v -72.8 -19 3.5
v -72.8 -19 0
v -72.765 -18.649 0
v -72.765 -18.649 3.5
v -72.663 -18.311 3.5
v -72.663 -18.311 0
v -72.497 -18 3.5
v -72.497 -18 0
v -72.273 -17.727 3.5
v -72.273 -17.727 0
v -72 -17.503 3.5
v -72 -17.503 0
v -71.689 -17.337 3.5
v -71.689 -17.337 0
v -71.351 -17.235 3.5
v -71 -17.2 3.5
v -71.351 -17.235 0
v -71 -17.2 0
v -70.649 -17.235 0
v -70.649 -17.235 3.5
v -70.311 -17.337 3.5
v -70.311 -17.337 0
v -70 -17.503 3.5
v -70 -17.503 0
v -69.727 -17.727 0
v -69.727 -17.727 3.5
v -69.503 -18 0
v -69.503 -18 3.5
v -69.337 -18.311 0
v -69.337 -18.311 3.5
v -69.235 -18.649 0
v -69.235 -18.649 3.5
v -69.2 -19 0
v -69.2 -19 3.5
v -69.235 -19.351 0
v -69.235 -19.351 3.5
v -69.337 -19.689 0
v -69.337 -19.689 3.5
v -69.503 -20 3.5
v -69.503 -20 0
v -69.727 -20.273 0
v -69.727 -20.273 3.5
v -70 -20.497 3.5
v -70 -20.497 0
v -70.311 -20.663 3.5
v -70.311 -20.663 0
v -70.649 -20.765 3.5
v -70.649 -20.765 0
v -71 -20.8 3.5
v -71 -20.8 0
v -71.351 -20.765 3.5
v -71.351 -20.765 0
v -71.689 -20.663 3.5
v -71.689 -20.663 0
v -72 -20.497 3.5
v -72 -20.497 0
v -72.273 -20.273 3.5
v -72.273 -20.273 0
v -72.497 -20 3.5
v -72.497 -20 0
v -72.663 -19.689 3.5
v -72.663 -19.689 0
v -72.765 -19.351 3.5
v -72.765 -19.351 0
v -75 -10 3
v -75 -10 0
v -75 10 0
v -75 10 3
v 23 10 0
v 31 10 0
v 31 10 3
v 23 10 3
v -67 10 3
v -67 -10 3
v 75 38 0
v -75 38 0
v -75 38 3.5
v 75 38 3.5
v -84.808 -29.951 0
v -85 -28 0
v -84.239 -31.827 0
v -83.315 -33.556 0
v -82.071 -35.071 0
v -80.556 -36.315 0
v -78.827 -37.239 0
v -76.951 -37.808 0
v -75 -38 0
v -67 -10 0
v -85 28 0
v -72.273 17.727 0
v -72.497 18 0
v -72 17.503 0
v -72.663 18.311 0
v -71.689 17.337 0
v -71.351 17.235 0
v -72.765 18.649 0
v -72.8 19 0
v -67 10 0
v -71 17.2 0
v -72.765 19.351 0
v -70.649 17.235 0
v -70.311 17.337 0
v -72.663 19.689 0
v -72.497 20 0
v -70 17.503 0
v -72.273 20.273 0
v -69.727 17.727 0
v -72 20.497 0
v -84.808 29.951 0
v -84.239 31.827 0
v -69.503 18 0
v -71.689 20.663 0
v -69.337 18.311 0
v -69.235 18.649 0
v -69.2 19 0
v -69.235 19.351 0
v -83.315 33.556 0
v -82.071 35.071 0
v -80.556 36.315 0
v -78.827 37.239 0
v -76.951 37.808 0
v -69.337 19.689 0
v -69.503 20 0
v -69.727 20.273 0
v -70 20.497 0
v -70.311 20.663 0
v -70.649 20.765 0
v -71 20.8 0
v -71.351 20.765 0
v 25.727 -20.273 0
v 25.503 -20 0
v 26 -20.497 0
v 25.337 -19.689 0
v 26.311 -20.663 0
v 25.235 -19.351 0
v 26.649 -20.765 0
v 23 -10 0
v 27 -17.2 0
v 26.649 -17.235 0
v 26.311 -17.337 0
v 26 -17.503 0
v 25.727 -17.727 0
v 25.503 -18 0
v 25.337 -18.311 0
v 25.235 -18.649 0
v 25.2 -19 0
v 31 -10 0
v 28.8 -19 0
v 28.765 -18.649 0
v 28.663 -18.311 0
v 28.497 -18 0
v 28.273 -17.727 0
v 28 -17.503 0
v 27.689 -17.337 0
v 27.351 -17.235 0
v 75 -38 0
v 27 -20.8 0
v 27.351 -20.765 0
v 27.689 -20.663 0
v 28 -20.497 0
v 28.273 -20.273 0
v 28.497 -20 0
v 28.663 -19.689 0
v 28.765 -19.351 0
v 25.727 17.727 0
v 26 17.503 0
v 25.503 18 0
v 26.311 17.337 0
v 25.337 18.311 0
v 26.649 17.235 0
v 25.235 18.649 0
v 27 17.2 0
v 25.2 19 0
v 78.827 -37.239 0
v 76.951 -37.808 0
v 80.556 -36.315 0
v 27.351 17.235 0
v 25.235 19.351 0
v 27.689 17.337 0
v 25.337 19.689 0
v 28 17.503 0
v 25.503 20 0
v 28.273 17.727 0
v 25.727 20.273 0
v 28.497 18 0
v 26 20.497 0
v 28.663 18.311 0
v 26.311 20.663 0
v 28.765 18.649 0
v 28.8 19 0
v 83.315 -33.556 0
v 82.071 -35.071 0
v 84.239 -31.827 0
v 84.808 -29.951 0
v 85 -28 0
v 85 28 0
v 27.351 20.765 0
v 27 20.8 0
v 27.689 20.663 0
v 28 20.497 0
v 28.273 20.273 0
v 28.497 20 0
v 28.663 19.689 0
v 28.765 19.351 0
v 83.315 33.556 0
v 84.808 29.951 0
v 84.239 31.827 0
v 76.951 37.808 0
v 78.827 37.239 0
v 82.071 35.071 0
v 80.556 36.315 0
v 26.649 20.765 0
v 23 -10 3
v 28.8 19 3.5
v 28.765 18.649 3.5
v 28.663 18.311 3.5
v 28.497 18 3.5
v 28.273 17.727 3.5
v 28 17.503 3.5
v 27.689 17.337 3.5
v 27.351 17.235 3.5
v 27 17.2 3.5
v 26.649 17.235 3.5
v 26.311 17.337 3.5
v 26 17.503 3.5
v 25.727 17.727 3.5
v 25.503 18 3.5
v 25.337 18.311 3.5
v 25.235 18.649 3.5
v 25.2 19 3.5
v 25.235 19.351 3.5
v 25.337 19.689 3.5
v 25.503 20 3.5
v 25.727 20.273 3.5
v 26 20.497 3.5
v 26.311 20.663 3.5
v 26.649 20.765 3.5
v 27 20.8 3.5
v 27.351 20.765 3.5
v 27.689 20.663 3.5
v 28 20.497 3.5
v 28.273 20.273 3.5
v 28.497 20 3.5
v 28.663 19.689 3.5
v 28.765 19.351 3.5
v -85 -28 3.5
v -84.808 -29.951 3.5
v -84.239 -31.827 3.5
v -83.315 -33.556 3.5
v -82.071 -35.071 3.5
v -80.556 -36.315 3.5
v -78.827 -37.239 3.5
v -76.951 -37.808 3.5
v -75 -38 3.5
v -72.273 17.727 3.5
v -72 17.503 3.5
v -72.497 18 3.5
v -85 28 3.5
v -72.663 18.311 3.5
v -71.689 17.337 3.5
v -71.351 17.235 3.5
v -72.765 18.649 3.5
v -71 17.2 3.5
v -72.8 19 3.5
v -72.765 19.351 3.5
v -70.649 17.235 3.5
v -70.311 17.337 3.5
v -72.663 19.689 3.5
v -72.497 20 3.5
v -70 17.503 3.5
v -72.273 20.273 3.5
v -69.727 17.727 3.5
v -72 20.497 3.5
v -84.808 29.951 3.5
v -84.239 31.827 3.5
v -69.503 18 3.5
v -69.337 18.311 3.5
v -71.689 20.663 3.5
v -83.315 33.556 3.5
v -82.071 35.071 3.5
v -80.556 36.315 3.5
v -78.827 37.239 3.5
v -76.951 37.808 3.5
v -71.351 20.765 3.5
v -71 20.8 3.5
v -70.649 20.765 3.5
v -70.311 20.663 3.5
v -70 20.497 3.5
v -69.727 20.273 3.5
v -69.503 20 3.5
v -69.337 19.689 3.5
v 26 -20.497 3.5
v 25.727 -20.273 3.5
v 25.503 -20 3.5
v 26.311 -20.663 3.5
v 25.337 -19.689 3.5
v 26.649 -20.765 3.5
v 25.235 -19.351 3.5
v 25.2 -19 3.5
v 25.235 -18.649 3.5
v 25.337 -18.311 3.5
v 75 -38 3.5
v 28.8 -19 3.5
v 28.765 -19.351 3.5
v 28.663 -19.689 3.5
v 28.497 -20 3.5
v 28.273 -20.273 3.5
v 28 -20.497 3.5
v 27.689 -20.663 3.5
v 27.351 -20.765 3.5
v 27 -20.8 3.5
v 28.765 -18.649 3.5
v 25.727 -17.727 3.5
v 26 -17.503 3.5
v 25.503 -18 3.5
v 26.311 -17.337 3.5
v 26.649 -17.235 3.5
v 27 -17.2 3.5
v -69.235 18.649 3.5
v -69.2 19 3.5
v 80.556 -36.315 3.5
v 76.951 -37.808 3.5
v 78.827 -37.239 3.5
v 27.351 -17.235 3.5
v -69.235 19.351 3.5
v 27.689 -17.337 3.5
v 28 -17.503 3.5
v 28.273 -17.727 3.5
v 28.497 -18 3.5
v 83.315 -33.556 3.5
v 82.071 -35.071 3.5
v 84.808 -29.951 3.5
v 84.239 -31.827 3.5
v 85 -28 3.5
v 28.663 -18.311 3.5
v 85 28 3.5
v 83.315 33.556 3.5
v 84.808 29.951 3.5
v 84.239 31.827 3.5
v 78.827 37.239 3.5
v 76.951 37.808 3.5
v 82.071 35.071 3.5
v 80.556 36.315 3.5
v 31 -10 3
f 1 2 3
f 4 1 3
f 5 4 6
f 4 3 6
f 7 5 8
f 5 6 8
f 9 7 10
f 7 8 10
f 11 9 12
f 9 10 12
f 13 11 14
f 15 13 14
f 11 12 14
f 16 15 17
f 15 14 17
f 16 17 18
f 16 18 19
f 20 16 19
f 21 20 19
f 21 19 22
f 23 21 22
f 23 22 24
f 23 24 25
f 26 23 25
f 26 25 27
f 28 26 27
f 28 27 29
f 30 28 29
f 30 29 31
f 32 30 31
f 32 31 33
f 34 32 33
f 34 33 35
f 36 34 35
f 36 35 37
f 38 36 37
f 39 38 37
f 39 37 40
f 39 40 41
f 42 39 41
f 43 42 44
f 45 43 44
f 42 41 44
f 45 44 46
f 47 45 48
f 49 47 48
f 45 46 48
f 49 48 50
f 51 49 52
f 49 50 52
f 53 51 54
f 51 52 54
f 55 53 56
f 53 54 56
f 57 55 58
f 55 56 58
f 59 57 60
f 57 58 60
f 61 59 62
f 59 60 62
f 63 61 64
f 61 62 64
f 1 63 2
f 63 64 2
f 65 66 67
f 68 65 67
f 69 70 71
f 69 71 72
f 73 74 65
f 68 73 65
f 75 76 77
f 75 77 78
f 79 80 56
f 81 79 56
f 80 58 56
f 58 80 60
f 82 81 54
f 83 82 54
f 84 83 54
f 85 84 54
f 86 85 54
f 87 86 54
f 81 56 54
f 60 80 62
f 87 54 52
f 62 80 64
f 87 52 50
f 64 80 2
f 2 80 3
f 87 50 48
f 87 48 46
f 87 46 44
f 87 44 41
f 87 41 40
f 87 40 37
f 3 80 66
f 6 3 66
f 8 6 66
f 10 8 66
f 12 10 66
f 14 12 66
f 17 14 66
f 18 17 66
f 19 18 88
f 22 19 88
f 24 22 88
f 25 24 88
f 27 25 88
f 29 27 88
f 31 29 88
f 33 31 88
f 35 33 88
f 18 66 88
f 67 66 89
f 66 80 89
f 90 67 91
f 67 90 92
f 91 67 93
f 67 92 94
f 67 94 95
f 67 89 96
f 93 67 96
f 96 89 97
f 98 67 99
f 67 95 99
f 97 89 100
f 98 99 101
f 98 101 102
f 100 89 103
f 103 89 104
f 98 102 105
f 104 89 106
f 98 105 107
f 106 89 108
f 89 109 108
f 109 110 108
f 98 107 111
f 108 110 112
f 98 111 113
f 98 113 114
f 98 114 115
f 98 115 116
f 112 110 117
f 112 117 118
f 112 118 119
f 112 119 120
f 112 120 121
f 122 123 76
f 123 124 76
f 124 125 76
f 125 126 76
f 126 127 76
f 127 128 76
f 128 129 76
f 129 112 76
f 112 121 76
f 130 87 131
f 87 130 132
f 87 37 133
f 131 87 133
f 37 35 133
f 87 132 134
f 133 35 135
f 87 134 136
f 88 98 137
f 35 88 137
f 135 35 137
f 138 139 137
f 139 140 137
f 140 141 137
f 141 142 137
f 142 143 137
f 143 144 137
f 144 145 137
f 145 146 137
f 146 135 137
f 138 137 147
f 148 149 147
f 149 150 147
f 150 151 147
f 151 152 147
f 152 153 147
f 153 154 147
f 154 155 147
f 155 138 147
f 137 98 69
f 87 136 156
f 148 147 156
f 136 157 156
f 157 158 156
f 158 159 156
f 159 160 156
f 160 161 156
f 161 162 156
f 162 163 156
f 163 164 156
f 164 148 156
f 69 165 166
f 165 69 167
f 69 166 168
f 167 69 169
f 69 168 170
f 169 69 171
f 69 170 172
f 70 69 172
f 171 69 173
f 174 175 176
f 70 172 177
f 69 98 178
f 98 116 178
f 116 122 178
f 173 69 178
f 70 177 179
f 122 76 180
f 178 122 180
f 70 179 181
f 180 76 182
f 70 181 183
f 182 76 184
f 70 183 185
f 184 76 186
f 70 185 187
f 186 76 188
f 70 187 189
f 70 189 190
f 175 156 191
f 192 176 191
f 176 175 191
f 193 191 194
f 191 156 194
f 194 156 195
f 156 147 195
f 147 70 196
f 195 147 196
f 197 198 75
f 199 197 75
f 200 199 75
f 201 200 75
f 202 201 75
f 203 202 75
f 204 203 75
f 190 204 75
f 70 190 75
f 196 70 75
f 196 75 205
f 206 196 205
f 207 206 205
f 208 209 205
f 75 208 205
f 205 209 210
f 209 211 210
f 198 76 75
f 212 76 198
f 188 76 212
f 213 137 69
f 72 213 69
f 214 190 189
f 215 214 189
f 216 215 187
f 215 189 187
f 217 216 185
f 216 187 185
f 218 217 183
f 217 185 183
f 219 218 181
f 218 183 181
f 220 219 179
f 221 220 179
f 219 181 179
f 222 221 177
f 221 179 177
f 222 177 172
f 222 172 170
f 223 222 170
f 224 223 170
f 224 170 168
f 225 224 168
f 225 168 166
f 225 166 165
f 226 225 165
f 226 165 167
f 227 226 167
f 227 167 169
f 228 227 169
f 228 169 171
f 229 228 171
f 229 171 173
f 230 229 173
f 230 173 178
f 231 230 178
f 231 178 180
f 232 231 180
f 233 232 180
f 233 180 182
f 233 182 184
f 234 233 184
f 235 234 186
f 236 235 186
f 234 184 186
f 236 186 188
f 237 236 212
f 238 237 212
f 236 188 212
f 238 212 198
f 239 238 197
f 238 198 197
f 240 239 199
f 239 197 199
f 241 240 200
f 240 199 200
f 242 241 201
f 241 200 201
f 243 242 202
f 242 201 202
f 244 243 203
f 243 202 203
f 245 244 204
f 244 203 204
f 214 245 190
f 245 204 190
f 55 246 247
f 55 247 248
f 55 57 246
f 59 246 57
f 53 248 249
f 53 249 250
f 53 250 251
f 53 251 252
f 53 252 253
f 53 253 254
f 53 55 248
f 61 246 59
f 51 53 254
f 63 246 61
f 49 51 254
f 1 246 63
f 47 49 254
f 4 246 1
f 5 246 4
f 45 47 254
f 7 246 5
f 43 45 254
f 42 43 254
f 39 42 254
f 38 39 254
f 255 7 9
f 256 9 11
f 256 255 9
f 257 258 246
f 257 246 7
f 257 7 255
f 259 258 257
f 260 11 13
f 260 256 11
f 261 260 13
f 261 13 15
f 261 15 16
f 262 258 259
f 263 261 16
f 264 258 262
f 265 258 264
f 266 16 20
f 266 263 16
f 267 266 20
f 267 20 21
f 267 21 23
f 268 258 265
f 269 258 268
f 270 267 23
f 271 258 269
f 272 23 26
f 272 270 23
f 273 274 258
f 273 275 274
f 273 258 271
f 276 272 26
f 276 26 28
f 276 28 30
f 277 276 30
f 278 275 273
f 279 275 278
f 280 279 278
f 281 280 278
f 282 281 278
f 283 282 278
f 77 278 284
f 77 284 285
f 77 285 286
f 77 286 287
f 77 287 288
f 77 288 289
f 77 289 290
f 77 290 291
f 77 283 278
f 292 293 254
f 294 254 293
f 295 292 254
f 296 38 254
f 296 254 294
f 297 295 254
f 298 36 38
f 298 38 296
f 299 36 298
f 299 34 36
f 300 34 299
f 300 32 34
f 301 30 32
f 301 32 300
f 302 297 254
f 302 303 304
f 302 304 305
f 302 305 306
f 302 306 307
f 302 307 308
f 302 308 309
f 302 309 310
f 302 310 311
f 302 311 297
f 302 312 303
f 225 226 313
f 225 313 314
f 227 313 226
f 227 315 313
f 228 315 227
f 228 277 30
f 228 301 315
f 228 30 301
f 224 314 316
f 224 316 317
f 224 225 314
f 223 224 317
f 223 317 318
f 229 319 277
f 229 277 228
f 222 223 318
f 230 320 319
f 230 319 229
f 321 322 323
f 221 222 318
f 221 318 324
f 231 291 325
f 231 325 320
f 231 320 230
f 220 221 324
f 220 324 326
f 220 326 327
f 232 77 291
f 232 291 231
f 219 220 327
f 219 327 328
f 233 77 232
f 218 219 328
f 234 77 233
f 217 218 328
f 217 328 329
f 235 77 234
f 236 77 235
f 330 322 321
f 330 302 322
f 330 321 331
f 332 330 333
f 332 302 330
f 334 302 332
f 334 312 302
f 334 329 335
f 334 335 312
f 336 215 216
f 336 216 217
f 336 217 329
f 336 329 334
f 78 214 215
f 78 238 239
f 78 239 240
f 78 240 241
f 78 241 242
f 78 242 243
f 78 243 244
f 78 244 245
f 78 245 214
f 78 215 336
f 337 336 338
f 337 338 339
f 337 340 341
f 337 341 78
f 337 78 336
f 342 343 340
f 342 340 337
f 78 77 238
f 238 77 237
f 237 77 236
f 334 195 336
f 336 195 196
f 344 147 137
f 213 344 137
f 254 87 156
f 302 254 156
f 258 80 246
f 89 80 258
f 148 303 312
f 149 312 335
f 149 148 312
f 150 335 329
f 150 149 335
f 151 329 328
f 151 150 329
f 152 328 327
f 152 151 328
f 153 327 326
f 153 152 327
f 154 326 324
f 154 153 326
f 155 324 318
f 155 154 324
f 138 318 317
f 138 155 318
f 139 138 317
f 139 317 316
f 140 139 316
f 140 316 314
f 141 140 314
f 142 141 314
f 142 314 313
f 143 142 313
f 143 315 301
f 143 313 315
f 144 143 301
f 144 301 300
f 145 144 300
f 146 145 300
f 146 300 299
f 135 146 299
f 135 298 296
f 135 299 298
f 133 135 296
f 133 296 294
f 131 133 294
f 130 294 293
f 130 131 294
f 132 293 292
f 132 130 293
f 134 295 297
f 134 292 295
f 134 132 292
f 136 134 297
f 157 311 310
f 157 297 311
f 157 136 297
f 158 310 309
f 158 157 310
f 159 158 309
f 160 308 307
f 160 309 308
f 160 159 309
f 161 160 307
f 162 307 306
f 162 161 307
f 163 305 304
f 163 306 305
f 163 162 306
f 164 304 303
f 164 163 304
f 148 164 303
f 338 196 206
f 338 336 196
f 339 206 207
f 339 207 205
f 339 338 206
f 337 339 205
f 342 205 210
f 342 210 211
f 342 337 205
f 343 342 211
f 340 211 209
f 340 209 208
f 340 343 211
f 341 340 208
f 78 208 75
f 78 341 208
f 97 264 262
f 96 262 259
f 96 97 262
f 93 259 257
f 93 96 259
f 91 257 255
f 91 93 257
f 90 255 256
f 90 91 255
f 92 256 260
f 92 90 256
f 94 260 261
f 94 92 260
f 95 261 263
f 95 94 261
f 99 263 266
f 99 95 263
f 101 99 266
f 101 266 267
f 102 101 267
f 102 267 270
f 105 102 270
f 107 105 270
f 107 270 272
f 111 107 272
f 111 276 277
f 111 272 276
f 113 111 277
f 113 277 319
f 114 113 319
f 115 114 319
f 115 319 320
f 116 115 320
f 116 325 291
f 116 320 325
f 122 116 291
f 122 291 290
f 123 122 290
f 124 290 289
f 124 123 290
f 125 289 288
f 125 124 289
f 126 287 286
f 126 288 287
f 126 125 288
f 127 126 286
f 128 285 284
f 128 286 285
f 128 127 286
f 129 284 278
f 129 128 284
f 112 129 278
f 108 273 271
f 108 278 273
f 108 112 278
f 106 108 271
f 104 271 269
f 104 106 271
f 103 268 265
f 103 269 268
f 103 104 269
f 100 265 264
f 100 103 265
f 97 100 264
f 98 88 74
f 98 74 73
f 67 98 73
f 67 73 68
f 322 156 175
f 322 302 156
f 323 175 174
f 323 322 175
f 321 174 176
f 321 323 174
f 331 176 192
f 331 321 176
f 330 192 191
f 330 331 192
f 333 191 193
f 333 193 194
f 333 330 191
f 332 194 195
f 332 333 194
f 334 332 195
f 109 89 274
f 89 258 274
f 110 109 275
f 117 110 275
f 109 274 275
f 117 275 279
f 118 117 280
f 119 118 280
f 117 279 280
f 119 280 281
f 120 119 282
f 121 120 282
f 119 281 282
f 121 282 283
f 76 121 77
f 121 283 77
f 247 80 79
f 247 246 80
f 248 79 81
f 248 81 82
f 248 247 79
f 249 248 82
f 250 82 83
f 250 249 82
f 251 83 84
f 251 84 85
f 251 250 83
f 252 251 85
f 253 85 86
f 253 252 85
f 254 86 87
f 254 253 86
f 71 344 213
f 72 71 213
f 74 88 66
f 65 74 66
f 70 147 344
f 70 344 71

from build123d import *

# Parameters (mm, degrees)
SKETCH_1_W               = 170
SKETCH_1_H               = 76
EXTRUDE_1_DEPTH          = 3.5
FILLET_1_R               = 10
SKETCH_2_W               = 8
SKETCH_2_H               = 20
CUT_EXTRUDE_1_DEPTH      = 3
SKETCH_3_W               = 8
SKETCH_3_H               = 20
CUT_EXTRUDE_2_DEPTH      = 3
SKETCH_6_R               = 1.8
CUT_EXTRUDE_4_DEPTH      = 4
MIRROR_2_COPY_1_SKETCH_R = 1.8
MIRROR_2_COPY_1_DEPTH    = 4


with BuildPart() as part:
    # 草图1 → 凸台-拉伸1 (new body)
    with BuildSketch(Plane.XY):
        Rectangle(SKETCH_1_W, SKETCH_1_H)
    extrude(amount=EXTRUDE_1_DEPTH)

    # 圆角1
    fillet_1_edges = [part.edges().sort_by_distance(p)[0] for p in [
        (85, -38, 1.75),
        (-85, -38, 1.75),
        (-85, 38, 1.75),
        (85, 38, 1.75),
    ]]
    fillet(fillet_1_edges, radius=FILLET_1_R)

    # 草图2 → 切除-拉伸1 (cut)
    with BuildSketch(Plane(origin=(0, 0, 0), x_dir=(-1, 0, 0), z_dir=(0, 0, -1))):
        with Locations((-27, 0)):
            Rectangle(SKETCH_2_W, SKETCH_2_H)
    extrude(amount=-CUT_EXTRUDE_1_DEPTH, mode=Mode.SUBTRACT)

    # 草图3 → 切除-拉伸2 (cut)
    with BuildSketch(Plane(origin=(0, 0, 0), x_dir=(-1, 0, 0), z_dir=(0, 0, -1))):
        with Locations((71, 0)):
            Rectangle(SKETCH_3_W, SKETCH_3_H)
    extrude(amount=-CUT_EXTRUDE_2_DEPTH, mode=Mode.SUBTRACT)

    # 草图6 → 切除-拉伸4 (cut)
    with BuildSketch(Plane(origin=(0, 0, 0), x_dir=(-1, 0, 0), z_dir=(0, 0, -1))):
        with Locations((71, -19)):
            Circle(SKETCH_6_R)
    cut_extrude_4 = extrude(amount=-CUT_EXTRUDE_4_DEPTH, mode=Mode.SUBTRACT)

    # 镜向1: 切除-拉伸4 across plane
    add(cut_extrude_4.mirror(Plane.ZX), mode=Mode.SUBTRACT)

    # 镜向2: 切除-拉伸4 across plane
    add(cut_extrude_4.mirror(Plane(origin=(-22, 0, 0), x_dir=(0, 0, 1), z_dir=(1, 0, 0))), mode=Mode.SUBTRACT)

    # 镜向2 copy 1 sketch → 镜向2 copy 1 (cut)
    with BuildSketch(Plane(origin=(-44, 0, 0), x_dir=(1, 0, 0), z_dir=(0, 0, -1))):
        with Locations((71, -19)):
            Circle(MIRROR_2_COPY_1_SKETCH_R)
    extrude(amount=-MIRROR_2_COPY_1_DEPTH, mode=Mode.SUBTRACT)


solid = part.part
